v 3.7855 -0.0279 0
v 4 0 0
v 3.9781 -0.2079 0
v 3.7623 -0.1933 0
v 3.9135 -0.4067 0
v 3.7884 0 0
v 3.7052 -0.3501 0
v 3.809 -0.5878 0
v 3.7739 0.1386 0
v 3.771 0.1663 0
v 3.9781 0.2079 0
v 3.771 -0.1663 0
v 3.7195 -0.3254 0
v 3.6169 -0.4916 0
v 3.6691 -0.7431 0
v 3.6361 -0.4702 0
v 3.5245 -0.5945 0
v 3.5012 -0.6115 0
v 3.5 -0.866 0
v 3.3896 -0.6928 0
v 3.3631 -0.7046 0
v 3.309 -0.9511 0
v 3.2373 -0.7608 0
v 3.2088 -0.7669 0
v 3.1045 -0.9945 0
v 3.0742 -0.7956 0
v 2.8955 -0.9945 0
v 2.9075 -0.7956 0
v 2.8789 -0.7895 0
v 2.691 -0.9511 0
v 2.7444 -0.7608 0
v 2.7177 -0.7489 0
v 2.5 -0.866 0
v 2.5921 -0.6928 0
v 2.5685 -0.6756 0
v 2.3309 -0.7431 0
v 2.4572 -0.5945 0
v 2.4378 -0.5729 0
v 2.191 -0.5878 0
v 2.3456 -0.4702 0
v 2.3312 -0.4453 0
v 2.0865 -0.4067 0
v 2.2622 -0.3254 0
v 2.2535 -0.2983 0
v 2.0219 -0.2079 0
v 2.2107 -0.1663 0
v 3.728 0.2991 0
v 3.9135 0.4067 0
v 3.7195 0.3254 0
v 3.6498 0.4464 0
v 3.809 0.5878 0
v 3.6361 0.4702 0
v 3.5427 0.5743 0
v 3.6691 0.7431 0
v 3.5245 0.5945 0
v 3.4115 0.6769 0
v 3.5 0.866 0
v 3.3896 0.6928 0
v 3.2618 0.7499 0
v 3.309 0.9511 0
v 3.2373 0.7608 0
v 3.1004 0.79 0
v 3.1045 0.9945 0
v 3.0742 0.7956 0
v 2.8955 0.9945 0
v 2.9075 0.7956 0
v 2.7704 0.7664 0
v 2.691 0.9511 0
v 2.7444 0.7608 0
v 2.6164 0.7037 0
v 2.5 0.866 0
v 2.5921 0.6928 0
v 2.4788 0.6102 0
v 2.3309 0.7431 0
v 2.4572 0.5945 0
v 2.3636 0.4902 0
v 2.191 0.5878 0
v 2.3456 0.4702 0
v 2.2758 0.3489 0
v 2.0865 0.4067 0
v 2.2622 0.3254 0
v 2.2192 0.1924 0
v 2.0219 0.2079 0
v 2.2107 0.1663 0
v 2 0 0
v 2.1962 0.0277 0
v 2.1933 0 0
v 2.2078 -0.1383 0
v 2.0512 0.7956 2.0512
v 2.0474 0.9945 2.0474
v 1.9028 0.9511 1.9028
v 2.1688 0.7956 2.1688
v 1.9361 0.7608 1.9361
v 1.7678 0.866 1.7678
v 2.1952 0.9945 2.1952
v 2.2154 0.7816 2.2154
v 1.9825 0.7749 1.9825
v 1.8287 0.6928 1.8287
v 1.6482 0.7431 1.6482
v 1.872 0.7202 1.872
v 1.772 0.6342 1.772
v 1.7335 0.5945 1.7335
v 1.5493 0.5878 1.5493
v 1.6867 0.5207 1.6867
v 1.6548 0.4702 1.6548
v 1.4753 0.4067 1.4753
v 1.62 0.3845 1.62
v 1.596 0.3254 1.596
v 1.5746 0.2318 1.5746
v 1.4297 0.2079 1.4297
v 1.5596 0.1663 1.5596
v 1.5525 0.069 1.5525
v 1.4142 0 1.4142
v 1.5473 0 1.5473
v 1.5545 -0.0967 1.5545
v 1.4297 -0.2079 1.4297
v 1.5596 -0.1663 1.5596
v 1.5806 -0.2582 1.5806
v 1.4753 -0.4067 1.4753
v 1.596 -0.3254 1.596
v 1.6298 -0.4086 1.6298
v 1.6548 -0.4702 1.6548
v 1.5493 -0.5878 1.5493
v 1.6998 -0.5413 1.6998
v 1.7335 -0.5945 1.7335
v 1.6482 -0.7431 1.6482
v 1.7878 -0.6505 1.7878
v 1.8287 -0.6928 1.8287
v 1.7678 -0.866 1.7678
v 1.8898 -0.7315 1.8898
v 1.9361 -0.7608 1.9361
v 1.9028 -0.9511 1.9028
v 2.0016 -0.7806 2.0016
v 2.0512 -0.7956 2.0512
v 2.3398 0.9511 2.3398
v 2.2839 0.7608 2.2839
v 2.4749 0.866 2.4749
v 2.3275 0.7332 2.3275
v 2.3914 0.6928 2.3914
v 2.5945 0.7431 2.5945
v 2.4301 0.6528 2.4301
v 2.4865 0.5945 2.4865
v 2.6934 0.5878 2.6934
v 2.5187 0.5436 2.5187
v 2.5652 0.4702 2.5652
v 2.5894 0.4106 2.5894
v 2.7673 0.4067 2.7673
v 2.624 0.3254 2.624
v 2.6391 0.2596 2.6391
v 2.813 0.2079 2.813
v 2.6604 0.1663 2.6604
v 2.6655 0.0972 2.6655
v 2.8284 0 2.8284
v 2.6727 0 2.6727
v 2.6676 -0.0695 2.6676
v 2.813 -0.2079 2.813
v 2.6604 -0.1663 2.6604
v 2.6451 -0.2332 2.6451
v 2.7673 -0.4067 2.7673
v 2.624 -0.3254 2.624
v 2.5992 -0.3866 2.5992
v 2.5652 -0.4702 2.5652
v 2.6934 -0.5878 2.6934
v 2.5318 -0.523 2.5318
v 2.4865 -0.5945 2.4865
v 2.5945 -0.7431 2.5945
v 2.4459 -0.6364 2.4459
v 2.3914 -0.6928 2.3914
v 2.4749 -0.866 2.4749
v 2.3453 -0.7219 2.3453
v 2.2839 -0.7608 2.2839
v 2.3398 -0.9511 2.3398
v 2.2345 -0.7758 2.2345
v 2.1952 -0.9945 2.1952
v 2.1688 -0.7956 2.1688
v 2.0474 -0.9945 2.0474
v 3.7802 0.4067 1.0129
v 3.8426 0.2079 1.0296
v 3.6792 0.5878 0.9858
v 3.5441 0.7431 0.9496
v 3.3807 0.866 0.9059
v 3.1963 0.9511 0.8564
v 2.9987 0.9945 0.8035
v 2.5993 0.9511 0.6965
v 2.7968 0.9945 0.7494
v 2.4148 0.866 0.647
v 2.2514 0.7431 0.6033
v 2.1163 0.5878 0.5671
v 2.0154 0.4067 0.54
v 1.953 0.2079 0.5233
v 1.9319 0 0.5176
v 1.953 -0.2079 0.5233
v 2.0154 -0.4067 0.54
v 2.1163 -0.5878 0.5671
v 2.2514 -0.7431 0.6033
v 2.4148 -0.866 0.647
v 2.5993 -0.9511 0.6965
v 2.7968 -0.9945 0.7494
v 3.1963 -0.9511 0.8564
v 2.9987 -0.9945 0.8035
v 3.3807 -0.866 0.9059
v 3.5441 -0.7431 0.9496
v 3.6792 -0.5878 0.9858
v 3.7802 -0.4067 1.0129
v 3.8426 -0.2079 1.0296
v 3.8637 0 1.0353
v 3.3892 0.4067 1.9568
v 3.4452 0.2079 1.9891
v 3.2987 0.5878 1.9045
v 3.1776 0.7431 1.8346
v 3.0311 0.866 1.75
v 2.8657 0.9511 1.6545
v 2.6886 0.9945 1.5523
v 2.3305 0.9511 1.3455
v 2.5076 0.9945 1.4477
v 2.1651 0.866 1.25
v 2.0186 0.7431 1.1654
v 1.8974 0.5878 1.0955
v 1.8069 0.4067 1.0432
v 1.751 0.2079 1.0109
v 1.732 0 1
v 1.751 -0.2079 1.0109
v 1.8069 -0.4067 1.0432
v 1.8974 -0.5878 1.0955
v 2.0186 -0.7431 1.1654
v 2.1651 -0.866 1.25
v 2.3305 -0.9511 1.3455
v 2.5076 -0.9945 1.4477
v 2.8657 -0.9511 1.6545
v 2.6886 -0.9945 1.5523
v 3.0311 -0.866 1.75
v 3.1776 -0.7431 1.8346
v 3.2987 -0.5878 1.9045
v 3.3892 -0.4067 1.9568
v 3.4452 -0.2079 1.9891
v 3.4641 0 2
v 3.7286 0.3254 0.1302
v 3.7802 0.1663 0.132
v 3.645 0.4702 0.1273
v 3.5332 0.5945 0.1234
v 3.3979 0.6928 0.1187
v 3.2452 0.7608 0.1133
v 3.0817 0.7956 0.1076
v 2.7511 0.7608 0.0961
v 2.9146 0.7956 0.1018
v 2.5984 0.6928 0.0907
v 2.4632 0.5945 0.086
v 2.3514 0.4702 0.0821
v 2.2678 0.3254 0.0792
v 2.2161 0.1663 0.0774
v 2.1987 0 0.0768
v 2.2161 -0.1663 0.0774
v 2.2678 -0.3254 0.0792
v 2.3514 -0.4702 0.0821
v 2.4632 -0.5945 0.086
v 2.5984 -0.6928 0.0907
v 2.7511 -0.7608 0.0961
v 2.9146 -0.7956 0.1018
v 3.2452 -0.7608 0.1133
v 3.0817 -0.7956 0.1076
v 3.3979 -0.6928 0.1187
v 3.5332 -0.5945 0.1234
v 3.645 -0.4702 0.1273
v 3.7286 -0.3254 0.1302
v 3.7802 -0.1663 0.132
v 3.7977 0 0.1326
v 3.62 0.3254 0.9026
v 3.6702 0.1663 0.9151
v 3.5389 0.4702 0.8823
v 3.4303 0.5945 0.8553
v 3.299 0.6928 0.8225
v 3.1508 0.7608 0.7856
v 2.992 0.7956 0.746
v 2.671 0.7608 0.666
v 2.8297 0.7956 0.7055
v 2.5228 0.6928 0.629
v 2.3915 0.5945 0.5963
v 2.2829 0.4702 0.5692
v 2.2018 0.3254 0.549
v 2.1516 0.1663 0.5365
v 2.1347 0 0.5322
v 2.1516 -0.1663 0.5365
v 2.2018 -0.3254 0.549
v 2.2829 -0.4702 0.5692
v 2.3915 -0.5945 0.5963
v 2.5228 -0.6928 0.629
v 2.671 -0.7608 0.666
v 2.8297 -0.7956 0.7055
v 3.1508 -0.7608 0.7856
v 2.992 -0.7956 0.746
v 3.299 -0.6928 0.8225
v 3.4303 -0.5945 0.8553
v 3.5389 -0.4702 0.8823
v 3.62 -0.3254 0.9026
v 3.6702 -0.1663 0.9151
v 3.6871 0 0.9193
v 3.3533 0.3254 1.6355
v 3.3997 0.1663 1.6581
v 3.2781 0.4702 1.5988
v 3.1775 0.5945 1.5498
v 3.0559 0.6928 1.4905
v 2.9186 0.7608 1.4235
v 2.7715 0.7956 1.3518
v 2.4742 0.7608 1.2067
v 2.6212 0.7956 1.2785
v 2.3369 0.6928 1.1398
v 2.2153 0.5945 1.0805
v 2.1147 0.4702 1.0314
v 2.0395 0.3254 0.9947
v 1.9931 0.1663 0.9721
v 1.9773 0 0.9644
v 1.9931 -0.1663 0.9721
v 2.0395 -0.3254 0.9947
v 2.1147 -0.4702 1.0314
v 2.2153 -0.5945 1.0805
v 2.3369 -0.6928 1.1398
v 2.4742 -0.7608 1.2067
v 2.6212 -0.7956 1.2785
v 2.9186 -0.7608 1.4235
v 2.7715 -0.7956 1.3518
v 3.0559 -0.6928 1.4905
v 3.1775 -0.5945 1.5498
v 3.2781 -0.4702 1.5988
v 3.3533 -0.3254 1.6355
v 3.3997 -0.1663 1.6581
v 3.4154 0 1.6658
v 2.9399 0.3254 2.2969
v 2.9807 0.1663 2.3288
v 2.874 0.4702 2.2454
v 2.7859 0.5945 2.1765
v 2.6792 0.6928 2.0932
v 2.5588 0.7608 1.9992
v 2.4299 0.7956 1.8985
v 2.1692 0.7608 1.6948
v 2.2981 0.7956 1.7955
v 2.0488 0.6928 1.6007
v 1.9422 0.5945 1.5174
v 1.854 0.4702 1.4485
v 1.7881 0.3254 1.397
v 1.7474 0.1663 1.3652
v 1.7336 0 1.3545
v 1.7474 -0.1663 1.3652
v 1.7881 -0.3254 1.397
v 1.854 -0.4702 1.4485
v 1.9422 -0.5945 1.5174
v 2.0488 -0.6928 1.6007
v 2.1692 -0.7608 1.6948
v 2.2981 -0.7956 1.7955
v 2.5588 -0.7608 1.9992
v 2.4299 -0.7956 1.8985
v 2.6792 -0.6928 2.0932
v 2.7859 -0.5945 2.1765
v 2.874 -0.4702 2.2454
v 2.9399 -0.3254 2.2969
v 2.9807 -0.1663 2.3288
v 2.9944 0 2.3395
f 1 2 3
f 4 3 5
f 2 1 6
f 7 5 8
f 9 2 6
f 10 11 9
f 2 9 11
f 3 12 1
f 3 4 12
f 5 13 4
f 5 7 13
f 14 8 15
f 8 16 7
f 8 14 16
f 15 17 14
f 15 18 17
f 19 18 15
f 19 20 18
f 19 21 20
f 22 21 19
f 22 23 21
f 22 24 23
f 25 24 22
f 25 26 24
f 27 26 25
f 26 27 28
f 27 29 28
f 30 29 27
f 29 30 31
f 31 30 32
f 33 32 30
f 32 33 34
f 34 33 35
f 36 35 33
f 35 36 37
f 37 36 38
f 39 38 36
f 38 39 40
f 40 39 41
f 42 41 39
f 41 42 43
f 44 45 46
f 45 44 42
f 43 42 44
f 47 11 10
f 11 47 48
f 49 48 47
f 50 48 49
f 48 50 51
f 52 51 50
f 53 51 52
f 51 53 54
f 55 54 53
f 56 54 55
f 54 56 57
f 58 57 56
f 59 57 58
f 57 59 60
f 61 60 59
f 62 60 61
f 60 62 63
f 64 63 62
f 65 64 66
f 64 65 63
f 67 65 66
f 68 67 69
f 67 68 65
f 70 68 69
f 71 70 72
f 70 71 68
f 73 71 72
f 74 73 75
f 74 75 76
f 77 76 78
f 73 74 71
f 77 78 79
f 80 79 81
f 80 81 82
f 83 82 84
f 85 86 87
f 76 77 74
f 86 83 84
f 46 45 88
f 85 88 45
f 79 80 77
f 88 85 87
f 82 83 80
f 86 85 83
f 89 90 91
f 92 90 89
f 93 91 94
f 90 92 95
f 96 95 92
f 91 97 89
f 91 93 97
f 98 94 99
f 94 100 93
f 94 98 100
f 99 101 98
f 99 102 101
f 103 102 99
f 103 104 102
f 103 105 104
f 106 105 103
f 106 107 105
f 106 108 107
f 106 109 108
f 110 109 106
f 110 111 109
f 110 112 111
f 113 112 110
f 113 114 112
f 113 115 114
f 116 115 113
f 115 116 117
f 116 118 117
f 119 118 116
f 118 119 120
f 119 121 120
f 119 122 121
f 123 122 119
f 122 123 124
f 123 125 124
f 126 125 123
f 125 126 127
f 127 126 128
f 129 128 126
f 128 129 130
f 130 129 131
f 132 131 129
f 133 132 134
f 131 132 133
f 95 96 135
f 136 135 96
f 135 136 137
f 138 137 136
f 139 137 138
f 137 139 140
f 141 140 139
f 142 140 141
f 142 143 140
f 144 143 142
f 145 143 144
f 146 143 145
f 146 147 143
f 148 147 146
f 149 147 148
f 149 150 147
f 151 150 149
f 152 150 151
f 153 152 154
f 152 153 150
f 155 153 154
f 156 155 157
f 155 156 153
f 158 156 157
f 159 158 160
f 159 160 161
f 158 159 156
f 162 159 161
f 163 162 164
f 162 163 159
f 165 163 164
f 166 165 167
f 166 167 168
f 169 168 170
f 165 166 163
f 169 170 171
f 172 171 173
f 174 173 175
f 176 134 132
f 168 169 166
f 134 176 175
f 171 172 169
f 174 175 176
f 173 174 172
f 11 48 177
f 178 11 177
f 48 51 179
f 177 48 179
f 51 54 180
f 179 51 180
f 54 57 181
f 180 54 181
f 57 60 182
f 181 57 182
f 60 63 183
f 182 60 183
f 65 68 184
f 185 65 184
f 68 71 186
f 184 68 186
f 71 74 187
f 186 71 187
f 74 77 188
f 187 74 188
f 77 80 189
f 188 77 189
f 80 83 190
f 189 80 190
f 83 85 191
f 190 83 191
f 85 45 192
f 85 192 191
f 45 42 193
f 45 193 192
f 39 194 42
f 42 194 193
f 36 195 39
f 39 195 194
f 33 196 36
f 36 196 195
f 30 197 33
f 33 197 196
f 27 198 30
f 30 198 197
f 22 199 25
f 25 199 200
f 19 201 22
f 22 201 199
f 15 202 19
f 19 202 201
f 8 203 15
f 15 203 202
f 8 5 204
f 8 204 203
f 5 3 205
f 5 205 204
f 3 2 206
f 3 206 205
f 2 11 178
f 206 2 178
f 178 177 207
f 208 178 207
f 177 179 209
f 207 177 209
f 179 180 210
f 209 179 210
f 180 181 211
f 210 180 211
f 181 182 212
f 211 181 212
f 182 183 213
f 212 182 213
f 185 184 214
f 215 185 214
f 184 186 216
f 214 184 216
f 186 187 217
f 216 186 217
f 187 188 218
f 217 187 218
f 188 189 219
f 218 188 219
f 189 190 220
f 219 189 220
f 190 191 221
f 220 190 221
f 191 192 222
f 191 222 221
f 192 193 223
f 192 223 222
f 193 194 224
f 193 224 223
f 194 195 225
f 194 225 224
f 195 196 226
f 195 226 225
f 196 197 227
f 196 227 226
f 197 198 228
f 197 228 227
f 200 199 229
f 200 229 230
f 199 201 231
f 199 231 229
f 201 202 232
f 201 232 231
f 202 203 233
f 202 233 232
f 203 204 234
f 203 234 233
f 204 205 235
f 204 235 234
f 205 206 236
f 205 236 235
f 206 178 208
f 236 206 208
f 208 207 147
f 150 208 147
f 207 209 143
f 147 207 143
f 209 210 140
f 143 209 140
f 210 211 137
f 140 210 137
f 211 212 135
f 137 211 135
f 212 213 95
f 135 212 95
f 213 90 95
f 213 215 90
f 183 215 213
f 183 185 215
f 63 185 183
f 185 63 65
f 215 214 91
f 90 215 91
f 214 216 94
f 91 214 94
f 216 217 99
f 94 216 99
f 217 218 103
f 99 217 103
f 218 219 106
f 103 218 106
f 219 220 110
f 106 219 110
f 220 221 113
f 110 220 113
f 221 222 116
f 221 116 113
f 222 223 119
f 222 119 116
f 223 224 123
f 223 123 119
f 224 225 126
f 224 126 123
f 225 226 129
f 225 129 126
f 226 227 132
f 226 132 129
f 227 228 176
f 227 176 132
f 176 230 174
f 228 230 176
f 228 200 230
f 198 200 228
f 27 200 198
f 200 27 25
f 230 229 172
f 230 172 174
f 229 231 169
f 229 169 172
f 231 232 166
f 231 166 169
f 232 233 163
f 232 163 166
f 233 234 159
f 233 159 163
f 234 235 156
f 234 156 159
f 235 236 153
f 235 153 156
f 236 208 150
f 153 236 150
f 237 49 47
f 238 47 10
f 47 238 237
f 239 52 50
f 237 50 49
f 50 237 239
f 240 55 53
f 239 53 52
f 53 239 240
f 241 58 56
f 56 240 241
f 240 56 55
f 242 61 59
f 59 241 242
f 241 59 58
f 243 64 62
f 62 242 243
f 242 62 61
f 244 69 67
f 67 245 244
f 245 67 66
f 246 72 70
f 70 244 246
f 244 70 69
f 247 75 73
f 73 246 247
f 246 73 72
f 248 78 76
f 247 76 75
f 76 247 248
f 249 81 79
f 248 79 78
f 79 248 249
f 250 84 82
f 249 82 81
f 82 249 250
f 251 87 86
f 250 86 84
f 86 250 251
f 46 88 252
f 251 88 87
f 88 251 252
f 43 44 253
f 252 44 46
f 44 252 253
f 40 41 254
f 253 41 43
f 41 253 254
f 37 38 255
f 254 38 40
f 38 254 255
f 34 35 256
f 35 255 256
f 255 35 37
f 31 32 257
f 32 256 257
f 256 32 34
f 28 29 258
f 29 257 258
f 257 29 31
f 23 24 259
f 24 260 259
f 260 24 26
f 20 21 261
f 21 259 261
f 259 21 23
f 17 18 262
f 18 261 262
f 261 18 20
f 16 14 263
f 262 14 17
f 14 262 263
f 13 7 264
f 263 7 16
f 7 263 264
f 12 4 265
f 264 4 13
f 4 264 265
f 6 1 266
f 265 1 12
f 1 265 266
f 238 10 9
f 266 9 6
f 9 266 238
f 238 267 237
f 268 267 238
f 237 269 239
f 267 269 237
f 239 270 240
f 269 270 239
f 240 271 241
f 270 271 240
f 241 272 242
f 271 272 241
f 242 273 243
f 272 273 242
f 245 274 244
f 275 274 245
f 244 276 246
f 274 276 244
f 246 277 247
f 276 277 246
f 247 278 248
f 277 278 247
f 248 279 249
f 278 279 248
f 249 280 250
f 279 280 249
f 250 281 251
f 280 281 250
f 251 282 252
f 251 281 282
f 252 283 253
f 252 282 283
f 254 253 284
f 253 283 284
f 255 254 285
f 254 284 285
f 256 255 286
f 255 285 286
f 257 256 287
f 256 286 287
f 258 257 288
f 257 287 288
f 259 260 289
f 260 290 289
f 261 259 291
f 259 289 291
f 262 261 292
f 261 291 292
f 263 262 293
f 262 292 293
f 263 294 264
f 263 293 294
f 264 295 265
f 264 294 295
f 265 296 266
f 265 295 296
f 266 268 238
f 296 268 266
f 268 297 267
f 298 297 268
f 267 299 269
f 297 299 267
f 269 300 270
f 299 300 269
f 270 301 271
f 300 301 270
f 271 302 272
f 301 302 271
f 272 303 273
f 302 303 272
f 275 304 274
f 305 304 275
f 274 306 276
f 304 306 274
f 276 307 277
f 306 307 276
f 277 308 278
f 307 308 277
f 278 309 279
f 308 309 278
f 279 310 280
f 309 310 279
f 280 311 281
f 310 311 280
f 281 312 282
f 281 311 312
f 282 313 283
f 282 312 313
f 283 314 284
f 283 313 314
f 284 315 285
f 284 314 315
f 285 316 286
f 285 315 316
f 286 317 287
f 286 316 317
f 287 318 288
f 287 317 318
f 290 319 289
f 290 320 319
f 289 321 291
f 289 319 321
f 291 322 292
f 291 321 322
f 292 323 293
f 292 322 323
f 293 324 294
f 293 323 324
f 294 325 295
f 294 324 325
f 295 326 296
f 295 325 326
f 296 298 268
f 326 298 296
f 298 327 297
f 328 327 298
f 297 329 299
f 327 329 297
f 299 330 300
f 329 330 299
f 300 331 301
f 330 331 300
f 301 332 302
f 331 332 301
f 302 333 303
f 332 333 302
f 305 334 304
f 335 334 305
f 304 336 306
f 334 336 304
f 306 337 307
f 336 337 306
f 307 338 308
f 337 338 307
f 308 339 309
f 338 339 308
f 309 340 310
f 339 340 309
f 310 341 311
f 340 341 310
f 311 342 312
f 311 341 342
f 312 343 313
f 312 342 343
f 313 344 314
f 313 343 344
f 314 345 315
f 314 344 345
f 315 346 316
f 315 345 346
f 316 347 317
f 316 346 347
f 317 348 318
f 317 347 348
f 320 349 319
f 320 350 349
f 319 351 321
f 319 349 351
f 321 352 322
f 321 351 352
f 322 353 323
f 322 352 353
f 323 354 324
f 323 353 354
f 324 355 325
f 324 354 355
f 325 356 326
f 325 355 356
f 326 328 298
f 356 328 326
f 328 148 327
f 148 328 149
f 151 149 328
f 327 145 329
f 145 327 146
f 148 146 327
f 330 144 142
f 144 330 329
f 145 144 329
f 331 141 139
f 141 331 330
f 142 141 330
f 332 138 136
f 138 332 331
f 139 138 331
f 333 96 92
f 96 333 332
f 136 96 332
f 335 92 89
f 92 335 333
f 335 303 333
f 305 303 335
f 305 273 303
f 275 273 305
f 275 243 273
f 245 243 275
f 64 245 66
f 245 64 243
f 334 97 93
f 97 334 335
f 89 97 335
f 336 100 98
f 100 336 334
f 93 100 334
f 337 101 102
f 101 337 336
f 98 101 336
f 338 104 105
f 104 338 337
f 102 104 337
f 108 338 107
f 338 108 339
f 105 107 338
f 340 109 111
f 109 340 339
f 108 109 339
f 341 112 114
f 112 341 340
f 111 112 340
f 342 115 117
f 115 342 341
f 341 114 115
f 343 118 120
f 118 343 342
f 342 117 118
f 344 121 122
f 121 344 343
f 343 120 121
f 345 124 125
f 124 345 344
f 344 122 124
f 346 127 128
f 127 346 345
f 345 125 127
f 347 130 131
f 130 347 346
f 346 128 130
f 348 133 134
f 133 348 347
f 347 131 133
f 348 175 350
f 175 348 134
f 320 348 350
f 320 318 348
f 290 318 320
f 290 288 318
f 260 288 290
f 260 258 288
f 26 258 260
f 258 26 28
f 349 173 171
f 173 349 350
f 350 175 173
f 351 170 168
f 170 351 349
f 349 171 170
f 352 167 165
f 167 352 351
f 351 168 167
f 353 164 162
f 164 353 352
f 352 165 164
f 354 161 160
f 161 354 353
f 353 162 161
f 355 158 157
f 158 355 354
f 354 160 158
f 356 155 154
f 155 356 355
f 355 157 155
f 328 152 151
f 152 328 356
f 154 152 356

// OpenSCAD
// Nicolì Angelo 2023 - THIS CODE IS LICENSED AS GPL-2.0
module Pipe_45(){

module pipe(raggio,angolo){
color("#a8b0b2")
rotate([90,0,0])
rotate_extrude(angle=angolo, $fn = $preview? 90: 30) 
translate([3, 0, 0])
circle(r = raggio, $fn = $preview? 90: 30);
}

difference(){
   translate([0,0])
   pipe(1,45);
   
   rotate([0,10,0])
   translate([0,0])
   pipe(0.8,60);
 }


module repeat(){
difference(){
 for (i =[-1:1]){
     translate([0,5*i,0])
     ring(1,90);
 }

 for (i =[-1:1]){
    rotate([0,10,0])
     translate([0,5*i,0])
     ring(0.8,110);
 }
 
}
}

}

Pipe_45();
